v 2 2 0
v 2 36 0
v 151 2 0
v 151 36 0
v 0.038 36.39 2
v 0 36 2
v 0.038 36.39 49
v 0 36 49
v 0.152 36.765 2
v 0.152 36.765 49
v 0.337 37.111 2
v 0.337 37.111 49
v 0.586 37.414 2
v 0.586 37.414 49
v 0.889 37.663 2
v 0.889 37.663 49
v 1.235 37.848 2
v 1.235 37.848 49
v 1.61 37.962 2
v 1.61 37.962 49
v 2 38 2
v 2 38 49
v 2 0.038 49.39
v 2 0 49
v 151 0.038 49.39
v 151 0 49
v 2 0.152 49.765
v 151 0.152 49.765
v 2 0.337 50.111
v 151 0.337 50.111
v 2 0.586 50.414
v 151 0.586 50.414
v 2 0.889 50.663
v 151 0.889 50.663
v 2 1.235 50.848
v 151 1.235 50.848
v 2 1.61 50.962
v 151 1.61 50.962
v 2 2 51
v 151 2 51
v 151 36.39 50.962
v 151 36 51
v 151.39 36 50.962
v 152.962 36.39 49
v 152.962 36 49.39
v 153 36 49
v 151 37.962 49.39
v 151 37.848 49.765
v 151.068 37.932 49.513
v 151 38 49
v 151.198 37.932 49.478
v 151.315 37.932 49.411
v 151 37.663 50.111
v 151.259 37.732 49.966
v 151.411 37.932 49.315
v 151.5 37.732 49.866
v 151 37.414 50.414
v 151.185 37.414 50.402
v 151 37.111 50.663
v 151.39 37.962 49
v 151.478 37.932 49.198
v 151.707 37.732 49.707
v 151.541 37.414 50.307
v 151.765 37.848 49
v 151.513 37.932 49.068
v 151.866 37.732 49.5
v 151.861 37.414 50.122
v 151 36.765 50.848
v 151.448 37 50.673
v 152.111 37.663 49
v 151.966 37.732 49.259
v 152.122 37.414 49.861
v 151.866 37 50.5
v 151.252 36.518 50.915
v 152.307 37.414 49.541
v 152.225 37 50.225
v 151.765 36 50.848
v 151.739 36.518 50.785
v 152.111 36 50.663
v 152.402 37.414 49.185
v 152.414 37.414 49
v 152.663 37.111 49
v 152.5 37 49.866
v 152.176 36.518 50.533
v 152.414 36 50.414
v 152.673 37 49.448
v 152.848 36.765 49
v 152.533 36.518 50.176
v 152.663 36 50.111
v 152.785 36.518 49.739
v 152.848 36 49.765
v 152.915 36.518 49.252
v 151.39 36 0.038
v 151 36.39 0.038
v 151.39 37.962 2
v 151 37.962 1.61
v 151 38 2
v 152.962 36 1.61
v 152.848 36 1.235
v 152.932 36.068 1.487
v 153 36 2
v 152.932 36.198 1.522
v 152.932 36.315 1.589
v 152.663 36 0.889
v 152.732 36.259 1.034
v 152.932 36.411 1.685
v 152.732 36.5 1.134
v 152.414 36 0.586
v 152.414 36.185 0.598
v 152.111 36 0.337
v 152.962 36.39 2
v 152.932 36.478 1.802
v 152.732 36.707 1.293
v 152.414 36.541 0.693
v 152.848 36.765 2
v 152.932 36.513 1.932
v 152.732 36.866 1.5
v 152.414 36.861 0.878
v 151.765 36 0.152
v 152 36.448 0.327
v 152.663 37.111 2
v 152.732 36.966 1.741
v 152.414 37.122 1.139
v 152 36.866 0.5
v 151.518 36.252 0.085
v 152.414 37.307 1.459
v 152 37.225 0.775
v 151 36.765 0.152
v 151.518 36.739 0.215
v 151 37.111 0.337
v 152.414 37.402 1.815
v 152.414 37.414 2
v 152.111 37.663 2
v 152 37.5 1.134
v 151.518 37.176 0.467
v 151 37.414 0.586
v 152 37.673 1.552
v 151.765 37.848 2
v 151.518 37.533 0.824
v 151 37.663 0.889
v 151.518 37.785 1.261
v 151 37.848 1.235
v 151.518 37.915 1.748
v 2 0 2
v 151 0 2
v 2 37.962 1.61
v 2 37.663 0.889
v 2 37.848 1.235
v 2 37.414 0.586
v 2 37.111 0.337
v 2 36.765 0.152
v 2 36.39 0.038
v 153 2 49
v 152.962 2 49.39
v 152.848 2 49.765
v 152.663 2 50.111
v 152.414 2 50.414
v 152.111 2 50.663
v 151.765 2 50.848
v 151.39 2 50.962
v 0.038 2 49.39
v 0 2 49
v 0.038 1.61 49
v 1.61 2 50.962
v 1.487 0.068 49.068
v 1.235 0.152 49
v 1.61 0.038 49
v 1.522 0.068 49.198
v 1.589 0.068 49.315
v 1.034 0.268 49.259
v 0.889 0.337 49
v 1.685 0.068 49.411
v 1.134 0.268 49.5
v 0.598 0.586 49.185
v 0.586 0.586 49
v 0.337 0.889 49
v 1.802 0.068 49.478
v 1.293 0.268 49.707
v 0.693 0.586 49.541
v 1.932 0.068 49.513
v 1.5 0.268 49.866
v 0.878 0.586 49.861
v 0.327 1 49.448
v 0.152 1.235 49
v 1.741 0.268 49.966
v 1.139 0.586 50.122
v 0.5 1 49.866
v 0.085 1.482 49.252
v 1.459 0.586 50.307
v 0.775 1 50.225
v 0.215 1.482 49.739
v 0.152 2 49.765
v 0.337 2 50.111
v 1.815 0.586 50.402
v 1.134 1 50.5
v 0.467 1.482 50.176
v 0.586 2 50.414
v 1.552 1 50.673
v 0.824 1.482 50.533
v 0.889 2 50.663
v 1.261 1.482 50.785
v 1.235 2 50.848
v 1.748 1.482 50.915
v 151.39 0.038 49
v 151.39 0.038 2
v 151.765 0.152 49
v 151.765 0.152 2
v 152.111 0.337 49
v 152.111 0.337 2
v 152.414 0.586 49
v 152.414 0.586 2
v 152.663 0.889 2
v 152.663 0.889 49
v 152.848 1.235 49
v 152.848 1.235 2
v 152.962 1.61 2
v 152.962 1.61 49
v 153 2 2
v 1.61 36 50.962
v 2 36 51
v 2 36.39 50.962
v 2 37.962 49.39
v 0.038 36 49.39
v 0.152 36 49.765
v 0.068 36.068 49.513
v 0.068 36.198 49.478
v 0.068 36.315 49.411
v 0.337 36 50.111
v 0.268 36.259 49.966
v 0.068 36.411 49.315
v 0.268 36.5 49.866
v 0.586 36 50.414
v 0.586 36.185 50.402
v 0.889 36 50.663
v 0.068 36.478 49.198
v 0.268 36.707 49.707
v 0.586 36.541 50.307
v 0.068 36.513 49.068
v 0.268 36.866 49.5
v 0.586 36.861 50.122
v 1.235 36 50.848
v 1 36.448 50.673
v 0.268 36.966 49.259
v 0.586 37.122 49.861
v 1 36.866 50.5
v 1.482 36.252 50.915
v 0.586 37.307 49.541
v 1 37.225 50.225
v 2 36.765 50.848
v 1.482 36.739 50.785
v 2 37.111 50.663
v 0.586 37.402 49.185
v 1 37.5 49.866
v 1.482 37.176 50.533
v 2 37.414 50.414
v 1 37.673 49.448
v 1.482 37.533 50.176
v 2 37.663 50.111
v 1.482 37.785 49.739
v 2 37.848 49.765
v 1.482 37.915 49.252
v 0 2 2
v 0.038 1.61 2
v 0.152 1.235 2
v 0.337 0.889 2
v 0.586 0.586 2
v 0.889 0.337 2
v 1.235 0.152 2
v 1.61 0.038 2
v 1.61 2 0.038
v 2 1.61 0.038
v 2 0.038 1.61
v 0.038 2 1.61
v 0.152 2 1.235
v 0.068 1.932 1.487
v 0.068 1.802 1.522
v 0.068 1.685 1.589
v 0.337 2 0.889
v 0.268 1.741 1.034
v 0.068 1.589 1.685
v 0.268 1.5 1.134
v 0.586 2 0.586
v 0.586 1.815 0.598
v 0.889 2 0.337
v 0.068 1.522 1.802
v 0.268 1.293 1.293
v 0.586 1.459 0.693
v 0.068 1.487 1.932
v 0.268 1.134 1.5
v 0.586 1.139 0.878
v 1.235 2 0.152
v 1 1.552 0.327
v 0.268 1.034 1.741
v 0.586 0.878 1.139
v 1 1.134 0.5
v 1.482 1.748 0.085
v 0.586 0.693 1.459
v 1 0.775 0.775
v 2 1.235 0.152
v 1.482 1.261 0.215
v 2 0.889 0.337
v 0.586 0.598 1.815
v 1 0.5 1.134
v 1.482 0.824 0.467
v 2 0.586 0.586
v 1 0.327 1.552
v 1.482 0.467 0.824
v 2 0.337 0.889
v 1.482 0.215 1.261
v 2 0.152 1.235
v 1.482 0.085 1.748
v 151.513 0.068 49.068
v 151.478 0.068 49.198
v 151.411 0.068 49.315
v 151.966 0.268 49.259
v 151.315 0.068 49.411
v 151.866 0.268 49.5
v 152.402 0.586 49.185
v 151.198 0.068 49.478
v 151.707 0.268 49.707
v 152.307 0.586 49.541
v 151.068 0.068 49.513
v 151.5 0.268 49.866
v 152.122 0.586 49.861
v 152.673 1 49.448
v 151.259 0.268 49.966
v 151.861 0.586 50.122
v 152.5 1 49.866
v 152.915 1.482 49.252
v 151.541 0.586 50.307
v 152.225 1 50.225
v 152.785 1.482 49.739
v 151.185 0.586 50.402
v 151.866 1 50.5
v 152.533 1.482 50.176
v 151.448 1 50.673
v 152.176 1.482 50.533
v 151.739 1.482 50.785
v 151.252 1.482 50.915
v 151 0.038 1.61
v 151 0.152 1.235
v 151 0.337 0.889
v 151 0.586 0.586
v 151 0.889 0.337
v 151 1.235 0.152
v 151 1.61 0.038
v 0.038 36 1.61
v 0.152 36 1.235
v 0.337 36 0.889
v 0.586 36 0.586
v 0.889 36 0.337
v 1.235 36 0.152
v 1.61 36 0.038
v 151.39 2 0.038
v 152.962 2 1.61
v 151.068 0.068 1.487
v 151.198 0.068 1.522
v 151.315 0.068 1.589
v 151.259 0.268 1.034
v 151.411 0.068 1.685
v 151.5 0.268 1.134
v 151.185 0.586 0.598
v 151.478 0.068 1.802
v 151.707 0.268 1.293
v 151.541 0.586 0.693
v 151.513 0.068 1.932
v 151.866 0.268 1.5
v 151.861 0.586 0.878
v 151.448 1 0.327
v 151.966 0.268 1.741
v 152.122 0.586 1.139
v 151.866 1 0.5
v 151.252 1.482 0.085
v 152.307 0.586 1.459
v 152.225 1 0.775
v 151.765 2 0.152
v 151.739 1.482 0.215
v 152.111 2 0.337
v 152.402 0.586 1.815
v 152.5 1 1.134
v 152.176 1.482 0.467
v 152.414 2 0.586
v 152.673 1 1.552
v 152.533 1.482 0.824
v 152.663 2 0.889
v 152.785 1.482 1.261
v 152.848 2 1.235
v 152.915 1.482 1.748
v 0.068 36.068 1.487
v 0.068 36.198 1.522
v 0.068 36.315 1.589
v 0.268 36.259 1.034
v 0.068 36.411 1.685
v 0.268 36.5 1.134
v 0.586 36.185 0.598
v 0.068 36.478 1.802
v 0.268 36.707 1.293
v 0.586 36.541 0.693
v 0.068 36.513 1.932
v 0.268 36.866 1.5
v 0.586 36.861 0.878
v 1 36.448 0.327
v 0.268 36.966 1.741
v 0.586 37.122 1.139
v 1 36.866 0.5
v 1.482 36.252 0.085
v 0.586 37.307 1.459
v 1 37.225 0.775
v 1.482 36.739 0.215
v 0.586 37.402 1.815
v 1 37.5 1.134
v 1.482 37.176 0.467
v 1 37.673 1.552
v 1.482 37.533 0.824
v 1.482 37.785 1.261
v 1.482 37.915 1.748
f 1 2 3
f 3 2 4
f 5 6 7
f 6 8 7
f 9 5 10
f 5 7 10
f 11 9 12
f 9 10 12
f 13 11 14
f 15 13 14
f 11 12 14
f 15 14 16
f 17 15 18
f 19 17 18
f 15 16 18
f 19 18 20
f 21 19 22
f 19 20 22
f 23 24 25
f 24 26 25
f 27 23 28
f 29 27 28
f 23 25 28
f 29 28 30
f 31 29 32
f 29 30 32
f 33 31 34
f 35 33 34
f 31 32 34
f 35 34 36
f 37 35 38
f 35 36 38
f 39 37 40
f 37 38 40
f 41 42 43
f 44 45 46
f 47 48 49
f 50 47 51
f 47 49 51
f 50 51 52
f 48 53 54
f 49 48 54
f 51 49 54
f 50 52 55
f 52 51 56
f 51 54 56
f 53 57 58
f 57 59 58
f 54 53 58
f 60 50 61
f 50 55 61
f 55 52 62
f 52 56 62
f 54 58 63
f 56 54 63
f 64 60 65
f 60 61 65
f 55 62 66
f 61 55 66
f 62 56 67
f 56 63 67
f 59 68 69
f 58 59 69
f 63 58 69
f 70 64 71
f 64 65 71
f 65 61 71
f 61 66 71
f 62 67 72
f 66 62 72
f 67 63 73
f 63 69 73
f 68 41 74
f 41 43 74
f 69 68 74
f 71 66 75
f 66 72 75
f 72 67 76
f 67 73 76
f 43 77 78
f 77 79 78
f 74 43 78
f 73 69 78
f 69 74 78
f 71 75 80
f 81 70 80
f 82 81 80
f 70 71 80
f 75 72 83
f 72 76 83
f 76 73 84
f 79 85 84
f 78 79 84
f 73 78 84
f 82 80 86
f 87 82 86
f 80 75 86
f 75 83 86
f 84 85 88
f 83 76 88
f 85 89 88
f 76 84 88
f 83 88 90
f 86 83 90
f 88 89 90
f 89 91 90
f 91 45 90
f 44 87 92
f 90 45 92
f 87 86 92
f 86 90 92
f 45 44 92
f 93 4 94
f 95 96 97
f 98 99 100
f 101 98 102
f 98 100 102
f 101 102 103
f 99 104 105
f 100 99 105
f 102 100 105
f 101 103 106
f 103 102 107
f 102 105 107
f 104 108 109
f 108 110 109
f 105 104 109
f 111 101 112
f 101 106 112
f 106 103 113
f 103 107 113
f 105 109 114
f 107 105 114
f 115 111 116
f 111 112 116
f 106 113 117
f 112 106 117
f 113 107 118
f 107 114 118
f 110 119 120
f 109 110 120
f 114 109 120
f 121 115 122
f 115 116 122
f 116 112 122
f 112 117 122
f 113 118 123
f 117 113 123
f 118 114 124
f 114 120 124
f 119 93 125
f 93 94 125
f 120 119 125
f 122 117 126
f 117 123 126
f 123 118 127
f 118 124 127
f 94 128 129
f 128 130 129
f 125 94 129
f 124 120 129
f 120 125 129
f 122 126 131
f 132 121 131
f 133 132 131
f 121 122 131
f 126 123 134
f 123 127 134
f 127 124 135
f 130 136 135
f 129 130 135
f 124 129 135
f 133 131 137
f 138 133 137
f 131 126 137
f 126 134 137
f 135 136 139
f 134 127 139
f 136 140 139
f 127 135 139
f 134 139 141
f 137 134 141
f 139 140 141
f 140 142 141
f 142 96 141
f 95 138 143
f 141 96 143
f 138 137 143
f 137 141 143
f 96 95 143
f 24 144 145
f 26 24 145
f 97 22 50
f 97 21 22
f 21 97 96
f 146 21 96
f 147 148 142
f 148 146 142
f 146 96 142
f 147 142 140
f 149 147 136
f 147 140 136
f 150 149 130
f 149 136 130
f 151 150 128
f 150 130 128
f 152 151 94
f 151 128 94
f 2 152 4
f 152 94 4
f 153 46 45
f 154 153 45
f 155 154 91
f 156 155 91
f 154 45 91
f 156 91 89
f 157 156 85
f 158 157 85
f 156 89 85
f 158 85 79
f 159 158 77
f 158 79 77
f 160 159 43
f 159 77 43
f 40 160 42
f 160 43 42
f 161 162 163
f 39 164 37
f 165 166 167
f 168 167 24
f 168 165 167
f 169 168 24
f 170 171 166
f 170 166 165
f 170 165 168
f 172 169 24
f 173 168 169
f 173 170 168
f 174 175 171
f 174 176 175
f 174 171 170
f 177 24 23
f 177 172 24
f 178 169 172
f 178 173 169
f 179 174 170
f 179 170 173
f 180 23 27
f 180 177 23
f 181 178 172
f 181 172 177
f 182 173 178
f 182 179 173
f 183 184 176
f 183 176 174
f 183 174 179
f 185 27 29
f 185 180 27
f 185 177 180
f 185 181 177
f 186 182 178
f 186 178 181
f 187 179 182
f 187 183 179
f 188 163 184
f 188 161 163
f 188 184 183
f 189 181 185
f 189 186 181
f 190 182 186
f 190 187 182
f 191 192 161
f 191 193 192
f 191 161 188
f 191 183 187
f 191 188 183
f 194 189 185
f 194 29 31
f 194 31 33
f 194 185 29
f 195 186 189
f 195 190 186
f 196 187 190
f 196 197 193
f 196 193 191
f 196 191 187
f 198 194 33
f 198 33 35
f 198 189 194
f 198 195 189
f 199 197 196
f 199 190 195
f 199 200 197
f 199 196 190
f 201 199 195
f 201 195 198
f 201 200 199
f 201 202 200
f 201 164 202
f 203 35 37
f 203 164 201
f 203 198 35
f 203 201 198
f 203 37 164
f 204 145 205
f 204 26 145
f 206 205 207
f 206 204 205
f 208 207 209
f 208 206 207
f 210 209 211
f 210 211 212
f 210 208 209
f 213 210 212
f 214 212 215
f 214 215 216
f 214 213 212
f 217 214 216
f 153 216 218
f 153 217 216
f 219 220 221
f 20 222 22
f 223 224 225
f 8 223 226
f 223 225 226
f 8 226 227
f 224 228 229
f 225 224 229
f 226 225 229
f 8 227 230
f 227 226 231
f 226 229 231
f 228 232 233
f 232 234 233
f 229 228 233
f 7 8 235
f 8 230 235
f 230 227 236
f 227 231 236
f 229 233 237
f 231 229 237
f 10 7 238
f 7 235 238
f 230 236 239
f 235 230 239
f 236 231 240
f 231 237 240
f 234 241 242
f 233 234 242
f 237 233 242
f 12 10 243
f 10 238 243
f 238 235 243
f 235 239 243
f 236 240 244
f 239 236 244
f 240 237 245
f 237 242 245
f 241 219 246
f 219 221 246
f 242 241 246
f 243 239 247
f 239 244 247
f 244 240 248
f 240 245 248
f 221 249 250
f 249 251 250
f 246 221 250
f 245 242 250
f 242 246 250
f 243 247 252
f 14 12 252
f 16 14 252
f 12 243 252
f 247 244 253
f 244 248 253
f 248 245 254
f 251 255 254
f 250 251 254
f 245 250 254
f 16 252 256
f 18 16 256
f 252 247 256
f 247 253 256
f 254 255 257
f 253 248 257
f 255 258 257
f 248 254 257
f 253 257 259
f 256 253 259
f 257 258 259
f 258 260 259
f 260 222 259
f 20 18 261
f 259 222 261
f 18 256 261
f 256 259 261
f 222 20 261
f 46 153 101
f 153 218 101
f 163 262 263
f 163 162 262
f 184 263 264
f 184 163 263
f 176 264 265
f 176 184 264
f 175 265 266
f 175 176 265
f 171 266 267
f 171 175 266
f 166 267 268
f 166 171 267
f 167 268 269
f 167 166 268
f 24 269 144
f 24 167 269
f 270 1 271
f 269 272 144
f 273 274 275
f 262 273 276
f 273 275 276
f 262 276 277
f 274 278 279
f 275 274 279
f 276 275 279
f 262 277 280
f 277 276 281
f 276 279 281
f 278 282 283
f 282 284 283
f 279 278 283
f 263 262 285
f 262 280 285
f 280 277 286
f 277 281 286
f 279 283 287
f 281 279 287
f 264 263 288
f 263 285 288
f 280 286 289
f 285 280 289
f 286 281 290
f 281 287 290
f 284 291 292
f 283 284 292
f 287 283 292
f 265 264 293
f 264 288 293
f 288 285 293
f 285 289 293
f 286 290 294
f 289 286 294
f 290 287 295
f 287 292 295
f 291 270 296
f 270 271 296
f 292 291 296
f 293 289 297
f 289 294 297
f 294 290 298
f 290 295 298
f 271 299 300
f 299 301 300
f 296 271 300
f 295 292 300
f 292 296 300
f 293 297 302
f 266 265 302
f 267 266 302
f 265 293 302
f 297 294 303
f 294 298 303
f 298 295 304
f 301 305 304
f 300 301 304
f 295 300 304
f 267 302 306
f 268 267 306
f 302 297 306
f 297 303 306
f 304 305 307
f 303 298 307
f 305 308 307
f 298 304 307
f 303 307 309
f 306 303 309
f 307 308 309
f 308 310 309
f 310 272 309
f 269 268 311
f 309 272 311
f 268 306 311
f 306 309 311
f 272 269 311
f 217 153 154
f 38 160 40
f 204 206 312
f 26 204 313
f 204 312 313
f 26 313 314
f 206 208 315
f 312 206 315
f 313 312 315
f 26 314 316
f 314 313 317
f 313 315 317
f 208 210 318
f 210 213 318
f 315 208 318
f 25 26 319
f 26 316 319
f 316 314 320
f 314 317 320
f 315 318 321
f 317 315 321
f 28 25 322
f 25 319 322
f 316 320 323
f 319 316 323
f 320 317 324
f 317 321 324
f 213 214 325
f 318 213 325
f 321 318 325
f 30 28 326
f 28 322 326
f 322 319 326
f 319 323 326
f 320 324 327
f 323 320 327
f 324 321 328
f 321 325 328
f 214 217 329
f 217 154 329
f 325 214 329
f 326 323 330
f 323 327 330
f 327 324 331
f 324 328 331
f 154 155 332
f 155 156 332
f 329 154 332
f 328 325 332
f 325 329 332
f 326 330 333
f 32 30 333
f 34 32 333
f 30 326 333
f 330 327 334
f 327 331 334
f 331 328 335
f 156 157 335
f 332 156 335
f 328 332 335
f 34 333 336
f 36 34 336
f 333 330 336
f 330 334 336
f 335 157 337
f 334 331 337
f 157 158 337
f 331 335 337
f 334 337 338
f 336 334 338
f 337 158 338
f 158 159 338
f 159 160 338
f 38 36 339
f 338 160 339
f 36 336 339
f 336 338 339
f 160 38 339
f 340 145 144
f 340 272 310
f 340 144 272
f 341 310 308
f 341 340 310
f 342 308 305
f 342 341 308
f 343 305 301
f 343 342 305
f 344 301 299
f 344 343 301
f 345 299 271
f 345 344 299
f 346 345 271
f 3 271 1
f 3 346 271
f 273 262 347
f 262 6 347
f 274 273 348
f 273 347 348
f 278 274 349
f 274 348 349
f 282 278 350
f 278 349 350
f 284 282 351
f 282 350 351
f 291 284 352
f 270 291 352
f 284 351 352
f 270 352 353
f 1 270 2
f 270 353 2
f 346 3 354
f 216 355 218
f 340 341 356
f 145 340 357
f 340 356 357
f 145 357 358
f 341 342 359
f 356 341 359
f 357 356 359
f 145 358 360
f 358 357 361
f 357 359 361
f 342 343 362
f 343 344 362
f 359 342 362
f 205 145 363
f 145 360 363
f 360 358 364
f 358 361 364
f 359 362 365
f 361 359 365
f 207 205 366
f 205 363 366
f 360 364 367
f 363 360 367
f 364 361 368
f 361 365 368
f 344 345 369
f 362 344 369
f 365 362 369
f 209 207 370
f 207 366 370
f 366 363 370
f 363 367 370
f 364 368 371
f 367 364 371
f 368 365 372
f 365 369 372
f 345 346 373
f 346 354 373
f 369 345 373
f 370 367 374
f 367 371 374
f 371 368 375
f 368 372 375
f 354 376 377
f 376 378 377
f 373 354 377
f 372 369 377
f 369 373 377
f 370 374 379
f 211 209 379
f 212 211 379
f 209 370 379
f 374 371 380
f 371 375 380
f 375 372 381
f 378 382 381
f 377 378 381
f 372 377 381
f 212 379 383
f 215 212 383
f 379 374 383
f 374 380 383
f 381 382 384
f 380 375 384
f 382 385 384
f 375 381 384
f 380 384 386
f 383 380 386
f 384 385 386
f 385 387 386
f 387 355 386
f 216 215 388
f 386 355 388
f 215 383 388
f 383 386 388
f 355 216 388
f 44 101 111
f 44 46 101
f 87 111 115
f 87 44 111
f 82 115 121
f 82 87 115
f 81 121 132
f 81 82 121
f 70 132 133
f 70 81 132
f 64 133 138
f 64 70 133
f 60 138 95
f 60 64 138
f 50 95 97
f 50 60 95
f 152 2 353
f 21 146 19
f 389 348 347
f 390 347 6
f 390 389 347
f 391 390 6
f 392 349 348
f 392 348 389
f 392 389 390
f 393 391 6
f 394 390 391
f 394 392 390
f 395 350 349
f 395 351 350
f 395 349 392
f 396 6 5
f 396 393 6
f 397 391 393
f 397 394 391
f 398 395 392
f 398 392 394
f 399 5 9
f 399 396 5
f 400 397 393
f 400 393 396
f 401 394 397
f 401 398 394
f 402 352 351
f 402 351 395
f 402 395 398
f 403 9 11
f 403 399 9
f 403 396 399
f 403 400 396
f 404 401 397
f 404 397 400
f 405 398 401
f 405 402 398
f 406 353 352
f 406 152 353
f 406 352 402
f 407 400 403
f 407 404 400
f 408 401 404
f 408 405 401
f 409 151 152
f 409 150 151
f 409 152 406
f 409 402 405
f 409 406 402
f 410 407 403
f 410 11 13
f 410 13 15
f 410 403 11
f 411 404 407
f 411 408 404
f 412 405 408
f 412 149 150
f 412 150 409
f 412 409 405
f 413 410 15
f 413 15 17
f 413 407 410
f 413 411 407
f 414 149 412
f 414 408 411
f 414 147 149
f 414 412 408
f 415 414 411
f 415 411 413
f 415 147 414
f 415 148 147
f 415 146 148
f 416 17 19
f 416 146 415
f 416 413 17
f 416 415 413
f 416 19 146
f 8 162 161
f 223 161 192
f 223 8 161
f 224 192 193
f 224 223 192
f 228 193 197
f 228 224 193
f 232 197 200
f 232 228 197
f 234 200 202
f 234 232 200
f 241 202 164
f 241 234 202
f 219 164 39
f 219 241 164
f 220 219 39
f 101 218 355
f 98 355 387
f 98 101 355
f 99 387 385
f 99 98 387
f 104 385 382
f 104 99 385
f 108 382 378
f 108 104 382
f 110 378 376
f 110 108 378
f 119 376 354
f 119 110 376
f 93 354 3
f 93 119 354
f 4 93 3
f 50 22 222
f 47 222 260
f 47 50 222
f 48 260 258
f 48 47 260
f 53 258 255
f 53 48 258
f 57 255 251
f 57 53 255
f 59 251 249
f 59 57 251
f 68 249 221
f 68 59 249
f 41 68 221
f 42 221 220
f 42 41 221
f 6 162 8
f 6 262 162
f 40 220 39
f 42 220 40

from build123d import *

# Parameters (mm, degrees)
IZIM1_W                     = 153
IZIM1_H                     = 38
Y_KSEKLIK_EKSTR_ZYON1_DEPTH = 51
RADYUS1_R                   = 2


with BuildPart() as part:
    # Çizim1 → Yükseklik-Ekstrüzyon1 (new body)
    with BuildSketch(Plane.XY):
        with Locations((76.5, 19)):
            Rectangle(IZIM1_W, IZIM1_H)
    extrude(amount=Y_KSEKLIK_EKSTR_ZYON1_DEPTH)

    # Radyus1
    radyus1_edges = [part.edges().sort_by_distance(p)[0] for p in [
        (153, 19, 51),
        (76.5, 38, 51),
        (0, 19, 51),
        (76.5, 38, 0),
        (153, 19, 0),
        (76.5, 0, 0),
        (0, 19, 0),
        (0, 38, 25.5),
        (153, 38, 25.5),
        (153, 0, 25.5),
        (0, 0, 25.5),
        (76.5, 0, 51),
    ]]
    fillet(radyus1_edges, radius=RADYUS1_R)


solid = part.part
